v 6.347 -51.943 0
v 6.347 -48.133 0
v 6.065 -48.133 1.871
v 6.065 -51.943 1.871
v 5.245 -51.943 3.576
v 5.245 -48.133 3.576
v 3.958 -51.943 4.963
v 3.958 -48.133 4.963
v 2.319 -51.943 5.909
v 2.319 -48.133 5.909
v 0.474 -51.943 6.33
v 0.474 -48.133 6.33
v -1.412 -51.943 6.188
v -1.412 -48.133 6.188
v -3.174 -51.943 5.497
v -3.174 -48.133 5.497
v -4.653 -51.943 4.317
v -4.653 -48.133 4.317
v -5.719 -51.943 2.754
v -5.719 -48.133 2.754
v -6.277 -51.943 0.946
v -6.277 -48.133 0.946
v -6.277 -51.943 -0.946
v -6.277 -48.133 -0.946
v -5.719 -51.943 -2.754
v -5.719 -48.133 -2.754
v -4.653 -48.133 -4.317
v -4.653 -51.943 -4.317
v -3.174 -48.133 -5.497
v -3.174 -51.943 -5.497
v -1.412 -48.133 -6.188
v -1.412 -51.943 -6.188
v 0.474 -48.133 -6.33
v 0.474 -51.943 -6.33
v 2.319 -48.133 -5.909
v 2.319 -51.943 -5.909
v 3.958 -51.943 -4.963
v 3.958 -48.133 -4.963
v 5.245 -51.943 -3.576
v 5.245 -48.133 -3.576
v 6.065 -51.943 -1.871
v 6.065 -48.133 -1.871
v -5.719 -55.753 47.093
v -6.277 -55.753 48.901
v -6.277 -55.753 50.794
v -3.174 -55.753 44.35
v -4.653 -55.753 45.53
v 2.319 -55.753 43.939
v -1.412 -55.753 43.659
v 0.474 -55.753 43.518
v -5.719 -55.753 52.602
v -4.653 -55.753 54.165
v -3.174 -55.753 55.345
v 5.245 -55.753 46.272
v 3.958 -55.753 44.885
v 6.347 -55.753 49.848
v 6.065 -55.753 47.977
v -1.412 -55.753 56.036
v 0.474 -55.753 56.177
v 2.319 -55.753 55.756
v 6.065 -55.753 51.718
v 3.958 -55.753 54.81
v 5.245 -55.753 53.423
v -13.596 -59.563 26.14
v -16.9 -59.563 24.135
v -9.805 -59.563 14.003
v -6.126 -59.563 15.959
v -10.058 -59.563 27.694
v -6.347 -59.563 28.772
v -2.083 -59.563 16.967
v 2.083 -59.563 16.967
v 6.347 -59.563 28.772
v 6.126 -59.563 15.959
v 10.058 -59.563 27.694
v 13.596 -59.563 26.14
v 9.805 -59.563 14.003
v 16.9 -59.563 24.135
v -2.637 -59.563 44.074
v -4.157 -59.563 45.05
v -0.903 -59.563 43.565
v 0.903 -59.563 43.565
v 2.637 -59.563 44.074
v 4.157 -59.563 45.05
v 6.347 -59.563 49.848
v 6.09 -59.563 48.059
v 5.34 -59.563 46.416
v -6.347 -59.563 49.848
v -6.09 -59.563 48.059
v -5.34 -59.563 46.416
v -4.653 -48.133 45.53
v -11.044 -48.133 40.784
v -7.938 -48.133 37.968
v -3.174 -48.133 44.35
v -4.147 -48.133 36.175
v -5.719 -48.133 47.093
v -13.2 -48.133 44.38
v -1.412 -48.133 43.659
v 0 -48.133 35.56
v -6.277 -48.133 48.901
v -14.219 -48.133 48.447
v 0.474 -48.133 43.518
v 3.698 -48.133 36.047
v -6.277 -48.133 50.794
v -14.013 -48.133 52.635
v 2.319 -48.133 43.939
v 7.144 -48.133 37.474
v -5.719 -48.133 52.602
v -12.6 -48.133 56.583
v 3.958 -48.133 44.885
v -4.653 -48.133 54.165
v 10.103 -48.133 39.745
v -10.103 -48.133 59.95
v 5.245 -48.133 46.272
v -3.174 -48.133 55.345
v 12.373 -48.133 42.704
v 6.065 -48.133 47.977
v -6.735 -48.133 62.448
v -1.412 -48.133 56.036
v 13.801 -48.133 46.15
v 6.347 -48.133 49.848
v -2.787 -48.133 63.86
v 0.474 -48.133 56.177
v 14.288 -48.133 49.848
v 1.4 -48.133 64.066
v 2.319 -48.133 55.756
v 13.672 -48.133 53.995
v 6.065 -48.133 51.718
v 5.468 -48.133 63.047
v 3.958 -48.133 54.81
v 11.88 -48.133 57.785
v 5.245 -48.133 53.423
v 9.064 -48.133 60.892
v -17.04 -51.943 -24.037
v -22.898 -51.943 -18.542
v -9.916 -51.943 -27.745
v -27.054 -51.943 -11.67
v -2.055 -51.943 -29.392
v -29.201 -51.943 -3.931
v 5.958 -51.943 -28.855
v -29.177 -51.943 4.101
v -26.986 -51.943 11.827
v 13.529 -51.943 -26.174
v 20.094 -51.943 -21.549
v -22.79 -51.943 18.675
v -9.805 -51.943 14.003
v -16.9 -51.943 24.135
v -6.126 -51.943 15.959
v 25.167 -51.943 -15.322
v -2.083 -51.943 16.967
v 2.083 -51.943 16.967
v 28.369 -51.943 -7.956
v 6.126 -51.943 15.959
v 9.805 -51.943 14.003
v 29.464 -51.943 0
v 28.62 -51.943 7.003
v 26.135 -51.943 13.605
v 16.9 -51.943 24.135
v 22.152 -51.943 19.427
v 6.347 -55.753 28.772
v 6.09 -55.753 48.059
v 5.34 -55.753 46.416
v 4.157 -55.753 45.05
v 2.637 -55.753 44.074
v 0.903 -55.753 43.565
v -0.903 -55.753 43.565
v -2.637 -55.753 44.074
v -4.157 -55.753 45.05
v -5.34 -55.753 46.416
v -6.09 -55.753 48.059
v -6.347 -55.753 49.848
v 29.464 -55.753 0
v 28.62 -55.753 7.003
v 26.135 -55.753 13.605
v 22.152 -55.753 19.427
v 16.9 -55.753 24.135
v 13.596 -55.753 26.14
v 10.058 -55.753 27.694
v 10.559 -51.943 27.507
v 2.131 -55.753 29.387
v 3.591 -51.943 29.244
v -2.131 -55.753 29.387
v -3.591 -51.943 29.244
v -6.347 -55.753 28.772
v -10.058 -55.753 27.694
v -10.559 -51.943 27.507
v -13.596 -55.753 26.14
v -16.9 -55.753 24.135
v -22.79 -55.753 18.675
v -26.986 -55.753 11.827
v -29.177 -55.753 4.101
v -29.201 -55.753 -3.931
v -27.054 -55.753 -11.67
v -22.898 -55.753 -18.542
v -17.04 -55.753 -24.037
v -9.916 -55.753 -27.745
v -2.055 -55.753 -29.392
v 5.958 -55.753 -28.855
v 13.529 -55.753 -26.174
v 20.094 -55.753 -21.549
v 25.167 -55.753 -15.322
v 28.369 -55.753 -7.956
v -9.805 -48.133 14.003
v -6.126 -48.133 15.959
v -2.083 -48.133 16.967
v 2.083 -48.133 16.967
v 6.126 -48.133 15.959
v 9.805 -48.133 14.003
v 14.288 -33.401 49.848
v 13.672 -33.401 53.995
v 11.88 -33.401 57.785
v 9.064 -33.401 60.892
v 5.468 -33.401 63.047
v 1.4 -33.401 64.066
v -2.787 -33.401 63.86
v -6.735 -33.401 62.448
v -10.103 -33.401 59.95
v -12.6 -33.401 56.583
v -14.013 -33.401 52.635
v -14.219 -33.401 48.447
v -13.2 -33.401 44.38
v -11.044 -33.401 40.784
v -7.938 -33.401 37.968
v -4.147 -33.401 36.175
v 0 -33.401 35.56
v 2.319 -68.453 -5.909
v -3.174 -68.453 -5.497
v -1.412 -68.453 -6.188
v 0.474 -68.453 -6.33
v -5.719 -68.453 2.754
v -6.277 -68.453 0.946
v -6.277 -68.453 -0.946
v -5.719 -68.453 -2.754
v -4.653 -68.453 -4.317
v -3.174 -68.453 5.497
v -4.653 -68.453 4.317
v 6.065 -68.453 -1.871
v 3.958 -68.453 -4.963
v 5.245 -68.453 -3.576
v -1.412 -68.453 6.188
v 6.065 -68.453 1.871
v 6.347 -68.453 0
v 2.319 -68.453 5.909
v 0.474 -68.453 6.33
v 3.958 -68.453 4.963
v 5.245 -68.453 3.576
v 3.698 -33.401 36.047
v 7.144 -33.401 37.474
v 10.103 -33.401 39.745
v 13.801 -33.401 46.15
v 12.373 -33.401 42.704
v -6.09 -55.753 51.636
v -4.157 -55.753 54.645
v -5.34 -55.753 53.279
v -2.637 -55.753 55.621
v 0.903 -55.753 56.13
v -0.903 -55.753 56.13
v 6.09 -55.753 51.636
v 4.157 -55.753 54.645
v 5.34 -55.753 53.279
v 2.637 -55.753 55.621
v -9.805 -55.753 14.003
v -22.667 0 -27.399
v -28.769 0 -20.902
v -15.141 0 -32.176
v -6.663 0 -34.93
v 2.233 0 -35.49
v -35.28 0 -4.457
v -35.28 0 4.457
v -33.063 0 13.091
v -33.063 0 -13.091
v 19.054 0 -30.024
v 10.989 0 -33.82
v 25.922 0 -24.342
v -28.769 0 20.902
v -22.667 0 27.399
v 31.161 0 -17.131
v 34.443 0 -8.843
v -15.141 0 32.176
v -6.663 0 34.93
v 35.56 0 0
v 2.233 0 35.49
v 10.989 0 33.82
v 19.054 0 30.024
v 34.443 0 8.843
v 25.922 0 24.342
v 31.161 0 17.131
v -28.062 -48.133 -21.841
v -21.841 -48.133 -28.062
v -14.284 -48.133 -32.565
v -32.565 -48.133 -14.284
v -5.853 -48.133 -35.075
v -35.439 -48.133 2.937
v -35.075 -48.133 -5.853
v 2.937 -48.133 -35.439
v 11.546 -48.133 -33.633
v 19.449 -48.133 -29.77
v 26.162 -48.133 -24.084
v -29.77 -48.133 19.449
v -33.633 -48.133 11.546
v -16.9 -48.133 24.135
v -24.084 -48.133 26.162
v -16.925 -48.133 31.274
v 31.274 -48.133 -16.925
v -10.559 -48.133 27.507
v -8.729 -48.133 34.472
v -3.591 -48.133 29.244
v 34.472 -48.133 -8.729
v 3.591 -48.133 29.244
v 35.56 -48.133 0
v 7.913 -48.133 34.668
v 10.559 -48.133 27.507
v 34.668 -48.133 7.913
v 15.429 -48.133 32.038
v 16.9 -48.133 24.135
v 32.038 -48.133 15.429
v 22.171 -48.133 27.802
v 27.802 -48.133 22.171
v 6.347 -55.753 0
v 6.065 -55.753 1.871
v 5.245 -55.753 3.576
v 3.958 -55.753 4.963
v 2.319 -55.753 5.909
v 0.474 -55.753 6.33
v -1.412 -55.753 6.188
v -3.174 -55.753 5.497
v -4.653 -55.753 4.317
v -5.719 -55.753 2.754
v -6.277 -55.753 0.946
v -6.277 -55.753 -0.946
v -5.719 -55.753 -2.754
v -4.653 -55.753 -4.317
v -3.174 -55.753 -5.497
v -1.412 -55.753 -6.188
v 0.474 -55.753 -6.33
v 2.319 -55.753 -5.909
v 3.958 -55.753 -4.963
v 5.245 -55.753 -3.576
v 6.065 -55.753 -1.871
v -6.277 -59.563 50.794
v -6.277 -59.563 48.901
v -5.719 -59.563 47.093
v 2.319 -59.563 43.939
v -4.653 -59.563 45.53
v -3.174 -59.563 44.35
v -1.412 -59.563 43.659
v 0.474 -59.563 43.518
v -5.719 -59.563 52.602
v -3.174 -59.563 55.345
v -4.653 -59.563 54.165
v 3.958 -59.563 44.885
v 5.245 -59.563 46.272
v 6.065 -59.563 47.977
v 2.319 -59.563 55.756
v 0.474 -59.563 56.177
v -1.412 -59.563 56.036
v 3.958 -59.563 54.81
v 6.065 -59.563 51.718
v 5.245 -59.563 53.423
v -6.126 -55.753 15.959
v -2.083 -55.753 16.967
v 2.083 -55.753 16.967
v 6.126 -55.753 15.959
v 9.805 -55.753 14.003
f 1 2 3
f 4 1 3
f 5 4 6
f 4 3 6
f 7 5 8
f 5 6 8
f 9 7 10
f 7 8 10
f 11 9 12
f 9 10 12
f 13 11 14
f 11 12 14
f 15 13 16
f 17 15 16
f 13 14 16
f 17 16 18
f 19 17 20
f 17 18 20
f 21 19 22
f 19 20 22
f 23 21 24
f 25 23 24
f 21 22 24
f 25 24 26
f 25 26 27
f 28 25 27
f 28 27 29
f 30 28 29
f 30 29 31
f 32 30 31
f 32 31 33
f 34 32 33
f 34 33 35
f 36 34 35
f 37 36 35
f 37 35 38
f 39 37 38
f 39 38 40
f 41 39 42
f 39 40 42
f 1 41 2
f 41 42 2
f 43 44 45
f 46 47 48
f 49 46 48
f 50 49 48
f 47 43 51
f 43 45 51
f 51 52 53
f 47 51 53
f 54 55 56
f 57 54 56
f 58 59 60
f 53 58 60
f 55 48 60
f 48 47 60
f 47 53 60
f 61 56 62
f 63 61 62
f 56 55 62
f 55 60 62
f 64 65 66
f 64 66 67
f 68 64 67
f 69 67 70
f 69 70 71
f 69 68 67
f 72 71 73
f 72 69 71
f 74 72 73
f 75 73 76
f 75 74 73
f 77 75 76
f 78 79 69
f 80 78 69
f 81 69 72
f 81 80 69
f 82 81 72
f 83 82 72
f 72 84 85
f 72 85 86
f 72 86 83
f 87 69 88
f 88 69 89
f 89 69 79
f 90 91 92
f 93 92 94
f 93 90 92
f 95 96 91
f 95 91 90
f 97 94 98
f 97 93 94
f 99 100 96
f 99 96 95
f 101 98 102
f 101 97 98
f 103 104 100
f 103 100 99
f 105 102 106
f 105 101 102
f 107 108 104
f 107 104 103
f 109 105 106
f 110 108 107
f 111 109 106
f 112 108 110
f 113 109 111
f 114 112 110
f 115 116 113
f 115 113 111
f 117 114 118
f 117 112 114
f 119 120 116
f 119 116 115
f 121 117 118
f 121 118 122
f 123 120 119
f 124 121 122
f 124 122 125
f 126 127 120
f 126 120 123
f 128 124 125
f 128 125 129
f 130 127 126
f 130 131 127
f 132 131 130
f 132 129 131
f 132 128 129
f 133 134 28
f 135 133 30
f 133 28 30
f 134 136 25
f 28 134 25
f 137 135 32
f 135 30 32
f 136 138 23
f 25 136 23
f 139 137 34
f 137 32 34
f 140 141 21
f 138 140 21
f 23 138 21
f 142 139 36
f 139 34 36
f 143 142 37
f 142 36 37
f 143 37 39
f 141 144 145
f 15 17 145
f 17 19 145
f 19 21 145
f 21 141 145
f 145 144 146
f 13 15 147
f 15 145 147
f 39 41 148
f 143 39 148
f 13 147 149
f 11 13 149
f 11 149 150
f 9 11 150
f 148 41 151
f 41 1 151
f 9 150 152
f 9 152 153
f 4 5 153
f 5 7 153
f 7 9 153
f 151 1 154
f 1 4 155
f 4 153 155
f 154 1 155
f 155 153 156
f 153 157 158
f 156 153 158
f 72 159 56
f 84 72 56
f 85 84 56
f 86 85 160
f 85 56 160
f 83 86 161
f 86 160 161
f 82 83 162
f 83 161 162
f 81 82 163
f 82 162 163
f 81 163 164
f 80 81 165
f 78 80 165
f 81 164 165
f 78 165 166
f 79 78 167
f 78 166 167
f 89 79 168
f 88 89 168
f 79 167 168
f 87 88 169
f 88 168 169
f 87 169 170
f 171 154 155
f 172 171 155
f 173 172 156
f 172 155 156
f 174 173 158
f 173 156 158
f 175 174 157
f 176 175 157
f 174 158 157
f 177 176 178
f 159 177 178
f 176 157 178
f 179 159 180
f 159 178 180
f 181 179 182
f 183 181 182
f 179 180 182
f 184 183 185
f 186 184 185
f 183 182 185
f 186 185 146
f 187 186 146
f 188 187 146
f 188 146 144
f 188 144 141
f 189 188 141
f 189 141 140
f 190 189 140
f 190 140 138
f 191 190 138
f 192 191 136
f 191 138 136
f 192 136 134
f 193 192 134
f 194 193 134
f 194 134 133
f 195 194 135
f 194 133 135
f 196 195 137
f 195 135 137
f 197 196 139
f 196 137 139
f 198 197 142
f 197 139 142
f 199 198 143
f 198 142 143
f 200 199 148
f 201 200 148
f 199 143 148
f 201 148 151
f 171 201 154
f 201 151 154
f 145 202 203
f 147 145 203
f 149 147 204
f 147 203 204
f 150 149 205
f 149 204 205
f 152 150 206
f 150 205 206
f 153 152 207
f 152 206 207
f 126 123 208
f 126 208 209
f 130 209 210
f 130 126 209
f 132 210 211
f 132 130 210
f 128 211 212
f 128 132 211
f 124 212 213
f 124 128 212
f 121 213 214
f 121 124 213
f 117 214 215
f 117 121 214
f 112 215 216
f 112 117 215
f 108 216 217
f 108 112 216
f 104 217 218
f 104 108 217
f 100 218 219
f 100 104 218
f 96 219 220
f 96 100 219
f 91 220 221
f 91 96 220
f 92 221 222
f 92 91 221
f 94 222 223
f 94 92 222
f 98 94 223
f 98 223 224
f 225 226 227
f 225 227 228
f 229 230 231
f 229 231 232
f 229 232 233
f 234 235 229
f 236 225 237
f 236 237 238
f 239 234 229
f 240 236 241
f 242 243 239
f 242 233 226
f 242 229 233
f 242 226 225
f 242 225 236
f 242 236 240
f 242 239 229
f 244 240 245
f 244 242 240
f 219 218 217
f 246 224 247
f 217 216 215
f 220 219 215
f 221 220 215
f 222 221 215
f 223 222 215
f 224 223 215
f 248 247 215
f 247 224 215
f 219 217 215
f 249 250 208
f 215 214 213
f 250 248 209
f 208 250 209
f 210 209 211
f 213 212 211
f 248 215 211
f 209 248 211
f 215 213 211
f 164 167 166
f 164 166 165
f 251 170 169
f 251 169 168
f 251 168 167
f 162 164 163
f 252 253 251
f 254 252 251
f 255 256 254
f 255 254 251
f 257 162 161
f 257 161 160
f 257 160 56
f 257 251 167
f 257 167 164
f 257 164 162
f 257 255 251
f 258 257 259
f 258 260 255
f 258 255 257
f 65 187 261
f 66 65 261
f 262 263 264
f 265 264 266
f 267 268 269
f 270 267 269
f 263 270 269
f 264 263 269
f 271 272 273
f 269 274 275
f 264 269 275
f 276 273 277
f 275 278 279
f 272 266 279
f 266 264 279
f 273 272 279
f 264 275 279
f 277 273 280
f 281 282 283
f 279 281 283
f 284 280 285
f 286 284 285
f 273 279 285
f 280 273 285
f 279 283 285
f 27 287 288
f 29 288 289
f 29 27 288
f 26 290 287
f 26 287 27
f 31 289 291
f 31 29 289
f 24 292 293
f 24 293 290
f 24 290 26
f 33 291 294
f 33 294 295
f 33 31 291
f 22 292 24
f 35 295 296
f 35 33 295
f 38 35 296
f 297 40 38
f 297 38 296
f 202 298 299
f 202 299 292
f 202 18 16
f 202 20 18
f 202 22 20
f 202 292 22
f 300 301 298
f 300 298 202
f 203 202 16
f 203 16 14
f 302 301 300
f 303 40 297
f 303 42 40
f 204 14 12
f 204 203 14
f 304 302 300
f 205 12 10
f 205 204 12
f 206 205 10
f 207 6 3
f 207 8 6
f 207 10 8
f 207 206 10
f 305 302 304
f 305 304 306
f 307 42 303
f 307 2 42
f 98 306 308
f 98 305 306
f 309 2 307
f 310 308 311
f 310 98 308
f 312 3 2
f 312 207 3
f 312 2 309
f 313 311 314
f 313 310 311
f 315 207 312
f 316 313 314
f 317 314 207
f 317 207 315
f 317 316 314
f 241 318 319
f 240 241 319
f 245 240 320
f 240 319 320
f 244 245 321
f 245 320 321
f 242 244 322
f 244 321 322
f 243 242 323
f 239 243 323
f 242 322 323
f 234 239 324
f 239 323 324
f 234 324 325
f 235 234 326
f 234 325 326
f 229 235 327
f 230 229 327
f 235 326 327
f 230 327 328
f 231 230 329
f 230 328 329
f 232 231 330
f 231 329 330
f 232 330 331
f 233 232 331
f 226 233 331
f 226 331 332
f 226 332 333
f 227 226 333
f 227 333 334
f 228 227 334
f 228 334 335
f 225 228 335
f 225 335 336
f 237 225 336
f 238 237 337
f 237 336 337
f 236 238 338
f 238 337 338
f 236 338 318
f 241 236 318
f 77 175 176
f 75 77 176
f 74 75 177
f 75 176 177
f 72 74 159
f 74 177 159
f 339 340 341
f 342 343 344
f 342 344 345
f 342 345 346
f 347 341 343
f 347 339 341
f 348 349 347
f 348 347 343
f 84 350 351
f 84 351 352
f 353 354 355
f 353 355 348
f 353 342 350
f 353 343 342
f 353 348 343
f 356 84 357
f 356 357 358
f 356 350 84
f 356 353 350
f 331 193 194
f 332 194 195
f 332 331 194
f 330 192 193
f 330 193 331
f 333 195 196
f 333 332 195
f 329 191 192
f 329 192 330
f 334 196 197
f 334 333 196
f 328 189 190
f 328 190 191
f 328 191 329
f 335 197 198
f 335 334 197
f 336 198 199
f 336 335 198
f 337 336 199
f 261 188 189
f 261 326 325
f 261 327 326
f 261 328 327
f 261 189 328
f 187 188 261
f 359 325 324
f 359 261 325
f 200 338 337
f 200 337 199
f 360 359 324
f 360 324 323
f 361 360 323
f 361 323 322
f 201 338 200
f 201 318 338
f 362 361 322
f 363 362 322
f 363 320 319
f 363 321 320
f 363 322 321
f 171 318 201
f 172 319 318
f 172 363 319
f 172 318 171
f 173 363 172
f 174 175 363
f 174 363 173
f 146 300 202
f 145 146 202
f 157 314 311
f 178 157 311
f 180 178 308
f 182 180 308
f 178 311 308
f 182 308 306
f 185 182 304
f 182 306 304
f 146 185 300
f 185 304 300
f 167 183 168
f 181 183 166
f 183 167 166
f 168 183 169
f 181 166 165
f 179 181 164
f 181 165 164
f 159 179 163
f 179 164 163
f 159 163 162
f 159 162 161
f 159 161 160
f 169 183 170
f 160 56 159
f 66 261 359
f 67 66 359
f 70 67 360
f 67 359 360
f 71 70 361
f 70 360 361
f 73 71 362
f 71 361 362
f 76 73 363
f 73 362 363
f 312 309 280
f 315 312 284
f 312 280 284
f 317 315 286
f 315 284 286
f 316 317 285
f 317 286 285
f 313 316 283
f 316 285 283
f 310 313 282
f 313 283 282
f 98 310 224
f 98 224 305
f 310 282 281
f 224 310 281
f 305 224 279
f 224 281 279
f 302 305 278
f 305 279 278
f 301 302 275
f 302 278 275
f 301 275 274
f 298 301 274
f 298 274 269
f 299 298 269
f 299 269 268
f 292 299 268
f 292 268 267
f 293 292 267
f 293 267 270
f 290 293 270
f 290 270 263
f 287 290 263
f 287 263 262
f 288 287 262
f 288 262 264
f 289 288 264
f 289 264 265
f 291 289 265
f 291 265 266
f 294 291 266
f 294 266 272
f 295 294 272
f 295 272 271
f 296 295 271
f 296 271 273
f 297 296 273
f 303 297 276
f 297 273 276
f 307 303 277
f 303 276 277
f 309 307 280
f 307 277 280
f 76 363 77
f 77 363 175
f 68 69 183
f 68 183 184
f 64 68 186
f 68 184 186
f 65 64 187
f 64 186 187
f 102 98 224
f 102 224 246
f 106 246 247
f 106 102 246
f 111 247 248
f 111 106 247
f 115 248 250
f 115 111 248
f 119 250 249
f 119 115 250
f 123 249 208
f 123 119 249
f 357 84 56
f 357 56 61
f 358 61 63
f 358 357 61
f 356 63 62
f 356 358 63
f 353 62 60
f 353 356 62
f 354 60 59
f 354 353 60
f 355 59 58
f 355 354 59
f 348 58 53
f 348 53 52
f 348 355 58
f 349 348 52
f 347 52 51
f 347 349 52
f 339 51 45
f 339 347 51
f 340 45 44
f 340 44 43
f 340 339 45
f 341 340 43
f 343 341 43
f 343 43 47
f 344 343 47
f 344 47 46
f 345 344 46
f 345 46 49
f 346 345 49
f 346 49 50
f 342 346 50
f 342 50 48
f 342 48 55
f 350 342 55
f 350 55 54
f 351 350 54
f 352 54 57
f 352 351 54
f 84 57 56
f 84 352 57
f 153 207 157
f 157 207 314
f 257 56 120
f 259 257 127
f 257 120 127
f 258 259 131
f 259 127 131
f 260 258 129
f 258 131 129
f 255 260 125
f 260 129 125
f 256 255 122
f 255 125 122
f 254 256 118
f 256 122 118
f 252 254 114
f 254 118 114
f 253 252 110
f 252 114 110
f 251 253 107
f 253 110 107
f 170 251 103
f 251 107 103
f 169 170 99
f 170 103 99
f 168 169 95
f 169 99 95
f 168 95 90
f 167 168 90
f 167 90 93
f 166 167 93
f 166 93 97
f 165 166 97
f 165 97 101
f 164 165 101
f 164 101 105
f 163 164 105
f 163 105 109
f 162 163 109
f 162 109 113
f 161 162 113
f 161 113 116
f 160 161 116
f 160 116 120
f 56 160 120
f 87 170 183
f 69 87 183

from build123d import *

# Parameters (mm, degrees)
F0_R      = 35.56
F1_DEPTH  = 48.133
F3_DEPTH  = 14.732
F4_R      = 6.34746
F5_DEPTH  = 3.81
F7_DEPTH  = 3.81
F8_R      = 6.34746
F9_DEPTH  = 7.62
F10_R     = 29.464
F11_DEPTH = 3.81
F12_R     = 6.34746
F13_DEPTH = 12.7
F15_DEPTH = 3.81
F17_DEPTH = 3.81
F19_DEPTH = 3.81


with BuildPart() as f1:
    # F0 (on Front) → F1 (new body)
    with BuildSketch(Plane.XZ):
        Circle(F0_R)
    extrude(amount=F1_DEPTH)

    # F2 (on face) → F3 (join)
    with BuildSketch(Plane.XZ.offset(48.133)):
        with BuildLine():
            ThreePointArc((7.5e-09, 35.56), (10.1027881389, 39.7447118665), (14.2875, 49.8475))
            ThreePointArc((14.2875, 49.8475), (-10.1027881389, 59.9502881335), (7.5e-09, 35.56))
        make_face()
    extrude(amount=-F3_DEPTH)

    # F4 (on face) → F5 (join)
    with BuildSketch(Plane.XZ.offset(48.133)):
        Circle(F4_R)
    extrude(amount=F5_DEPTH)

    # F6 (on face) → F7 (join)
    with BuildSketch(Plane.XZ.offset(48.133)):
        with BuildLine():
            ThreePointArc((-9.8048303183, 14.0027488755), (0, 17.0942), (9.8048303183, 14.0027488755))
            Line((9.8048303183, 14.0027488755), (16.8998561206, 24.1354958329))
            ThreePointArc((16.8998561206, 24.1354958329), (0, 29.464), (-16.8998561206, 24.1354958329))
            Line((-16.8998561206, 24.1354958329), (-9.8048303183, 14.0027488755))
        make_face()
    extrude(amount=F7_DEPTH)

    # F8 (on face) → F9 (join)
    with BuildSketch(Plane.XZ.offset(48.133)):
        with Locations((0, 49.8475)):
            Circle(F8_R)
    extrude(amount=F9_DEPTH)

    # F10 (on face) → F11 (join)
    with BuildSketch(Plane.XZ.offset(51.943)):
        Circle(F10_R)
    extrude(amount=F11_DEPTH)

    # F12 (on face) → F13 (join)
    with BuildSketch(Plane.XZ.offset(55.753)):
        Circle(F12_R)
    extrude(amount=F13_DEPTH)

    # F14 (on face) → F15 (join)
    with BuildSketch(Plane.XZ.offset(55.753)):
        with BuildLine():
            ThreePointArc((-9.8048303183, 14.0027488755), (0, 17.0942), (9.8048303183, 14.0027488755))
            Line((9.8048303183, 14.0027488755), (16.8998561206, 24.1354958329))
            ThreePointArc((16.8998561206, 24.1354958329), (0, 29.464), (-16.8998561206, 24.1354958329))
            Line((-16.8998561206, 24.1354958329), (-9.8048303183, 14.0027488755))
        make_face()
    extrude(amount=F15_DEPTH)

    # F16 (on face) → F17 (join)
    with BuildSketch(Plane.XZ.offset(55.753)):
        with BuildLine():
            ThreePointArc((6.34746, 49.8475), (0, 43.50004), (-6.34746, 49.8475))
            Line((-6.34746, 49.8475), (-6.34746, 17.1236544847))
            Line((-6.34746, 17.1236544847), (6.34746, 17.1236544847))
            Line((6.34746, 17.1236544847), (6.34746, 49.8475))
        make_face()
    extrude(amount=F17_DEPTH)


with BuildPart() as f19:
    # F18 (on face) → F19 (new body)
    with BuildSketch(Plane.XZ.offset(59.563)):
        with BuildLine():
            ThreePointArc((-6.34746, 49.8475), (0, 43.50004), (6.34746, 49.8475))
            ThreePointArc((6.34746, 49.8475), (0, 56.19496), (-6.34746, 49.8475))
        make_face()
    extrude(amount=-F19_DEPTH)


solid = Compound([f1.part, f19.part])
